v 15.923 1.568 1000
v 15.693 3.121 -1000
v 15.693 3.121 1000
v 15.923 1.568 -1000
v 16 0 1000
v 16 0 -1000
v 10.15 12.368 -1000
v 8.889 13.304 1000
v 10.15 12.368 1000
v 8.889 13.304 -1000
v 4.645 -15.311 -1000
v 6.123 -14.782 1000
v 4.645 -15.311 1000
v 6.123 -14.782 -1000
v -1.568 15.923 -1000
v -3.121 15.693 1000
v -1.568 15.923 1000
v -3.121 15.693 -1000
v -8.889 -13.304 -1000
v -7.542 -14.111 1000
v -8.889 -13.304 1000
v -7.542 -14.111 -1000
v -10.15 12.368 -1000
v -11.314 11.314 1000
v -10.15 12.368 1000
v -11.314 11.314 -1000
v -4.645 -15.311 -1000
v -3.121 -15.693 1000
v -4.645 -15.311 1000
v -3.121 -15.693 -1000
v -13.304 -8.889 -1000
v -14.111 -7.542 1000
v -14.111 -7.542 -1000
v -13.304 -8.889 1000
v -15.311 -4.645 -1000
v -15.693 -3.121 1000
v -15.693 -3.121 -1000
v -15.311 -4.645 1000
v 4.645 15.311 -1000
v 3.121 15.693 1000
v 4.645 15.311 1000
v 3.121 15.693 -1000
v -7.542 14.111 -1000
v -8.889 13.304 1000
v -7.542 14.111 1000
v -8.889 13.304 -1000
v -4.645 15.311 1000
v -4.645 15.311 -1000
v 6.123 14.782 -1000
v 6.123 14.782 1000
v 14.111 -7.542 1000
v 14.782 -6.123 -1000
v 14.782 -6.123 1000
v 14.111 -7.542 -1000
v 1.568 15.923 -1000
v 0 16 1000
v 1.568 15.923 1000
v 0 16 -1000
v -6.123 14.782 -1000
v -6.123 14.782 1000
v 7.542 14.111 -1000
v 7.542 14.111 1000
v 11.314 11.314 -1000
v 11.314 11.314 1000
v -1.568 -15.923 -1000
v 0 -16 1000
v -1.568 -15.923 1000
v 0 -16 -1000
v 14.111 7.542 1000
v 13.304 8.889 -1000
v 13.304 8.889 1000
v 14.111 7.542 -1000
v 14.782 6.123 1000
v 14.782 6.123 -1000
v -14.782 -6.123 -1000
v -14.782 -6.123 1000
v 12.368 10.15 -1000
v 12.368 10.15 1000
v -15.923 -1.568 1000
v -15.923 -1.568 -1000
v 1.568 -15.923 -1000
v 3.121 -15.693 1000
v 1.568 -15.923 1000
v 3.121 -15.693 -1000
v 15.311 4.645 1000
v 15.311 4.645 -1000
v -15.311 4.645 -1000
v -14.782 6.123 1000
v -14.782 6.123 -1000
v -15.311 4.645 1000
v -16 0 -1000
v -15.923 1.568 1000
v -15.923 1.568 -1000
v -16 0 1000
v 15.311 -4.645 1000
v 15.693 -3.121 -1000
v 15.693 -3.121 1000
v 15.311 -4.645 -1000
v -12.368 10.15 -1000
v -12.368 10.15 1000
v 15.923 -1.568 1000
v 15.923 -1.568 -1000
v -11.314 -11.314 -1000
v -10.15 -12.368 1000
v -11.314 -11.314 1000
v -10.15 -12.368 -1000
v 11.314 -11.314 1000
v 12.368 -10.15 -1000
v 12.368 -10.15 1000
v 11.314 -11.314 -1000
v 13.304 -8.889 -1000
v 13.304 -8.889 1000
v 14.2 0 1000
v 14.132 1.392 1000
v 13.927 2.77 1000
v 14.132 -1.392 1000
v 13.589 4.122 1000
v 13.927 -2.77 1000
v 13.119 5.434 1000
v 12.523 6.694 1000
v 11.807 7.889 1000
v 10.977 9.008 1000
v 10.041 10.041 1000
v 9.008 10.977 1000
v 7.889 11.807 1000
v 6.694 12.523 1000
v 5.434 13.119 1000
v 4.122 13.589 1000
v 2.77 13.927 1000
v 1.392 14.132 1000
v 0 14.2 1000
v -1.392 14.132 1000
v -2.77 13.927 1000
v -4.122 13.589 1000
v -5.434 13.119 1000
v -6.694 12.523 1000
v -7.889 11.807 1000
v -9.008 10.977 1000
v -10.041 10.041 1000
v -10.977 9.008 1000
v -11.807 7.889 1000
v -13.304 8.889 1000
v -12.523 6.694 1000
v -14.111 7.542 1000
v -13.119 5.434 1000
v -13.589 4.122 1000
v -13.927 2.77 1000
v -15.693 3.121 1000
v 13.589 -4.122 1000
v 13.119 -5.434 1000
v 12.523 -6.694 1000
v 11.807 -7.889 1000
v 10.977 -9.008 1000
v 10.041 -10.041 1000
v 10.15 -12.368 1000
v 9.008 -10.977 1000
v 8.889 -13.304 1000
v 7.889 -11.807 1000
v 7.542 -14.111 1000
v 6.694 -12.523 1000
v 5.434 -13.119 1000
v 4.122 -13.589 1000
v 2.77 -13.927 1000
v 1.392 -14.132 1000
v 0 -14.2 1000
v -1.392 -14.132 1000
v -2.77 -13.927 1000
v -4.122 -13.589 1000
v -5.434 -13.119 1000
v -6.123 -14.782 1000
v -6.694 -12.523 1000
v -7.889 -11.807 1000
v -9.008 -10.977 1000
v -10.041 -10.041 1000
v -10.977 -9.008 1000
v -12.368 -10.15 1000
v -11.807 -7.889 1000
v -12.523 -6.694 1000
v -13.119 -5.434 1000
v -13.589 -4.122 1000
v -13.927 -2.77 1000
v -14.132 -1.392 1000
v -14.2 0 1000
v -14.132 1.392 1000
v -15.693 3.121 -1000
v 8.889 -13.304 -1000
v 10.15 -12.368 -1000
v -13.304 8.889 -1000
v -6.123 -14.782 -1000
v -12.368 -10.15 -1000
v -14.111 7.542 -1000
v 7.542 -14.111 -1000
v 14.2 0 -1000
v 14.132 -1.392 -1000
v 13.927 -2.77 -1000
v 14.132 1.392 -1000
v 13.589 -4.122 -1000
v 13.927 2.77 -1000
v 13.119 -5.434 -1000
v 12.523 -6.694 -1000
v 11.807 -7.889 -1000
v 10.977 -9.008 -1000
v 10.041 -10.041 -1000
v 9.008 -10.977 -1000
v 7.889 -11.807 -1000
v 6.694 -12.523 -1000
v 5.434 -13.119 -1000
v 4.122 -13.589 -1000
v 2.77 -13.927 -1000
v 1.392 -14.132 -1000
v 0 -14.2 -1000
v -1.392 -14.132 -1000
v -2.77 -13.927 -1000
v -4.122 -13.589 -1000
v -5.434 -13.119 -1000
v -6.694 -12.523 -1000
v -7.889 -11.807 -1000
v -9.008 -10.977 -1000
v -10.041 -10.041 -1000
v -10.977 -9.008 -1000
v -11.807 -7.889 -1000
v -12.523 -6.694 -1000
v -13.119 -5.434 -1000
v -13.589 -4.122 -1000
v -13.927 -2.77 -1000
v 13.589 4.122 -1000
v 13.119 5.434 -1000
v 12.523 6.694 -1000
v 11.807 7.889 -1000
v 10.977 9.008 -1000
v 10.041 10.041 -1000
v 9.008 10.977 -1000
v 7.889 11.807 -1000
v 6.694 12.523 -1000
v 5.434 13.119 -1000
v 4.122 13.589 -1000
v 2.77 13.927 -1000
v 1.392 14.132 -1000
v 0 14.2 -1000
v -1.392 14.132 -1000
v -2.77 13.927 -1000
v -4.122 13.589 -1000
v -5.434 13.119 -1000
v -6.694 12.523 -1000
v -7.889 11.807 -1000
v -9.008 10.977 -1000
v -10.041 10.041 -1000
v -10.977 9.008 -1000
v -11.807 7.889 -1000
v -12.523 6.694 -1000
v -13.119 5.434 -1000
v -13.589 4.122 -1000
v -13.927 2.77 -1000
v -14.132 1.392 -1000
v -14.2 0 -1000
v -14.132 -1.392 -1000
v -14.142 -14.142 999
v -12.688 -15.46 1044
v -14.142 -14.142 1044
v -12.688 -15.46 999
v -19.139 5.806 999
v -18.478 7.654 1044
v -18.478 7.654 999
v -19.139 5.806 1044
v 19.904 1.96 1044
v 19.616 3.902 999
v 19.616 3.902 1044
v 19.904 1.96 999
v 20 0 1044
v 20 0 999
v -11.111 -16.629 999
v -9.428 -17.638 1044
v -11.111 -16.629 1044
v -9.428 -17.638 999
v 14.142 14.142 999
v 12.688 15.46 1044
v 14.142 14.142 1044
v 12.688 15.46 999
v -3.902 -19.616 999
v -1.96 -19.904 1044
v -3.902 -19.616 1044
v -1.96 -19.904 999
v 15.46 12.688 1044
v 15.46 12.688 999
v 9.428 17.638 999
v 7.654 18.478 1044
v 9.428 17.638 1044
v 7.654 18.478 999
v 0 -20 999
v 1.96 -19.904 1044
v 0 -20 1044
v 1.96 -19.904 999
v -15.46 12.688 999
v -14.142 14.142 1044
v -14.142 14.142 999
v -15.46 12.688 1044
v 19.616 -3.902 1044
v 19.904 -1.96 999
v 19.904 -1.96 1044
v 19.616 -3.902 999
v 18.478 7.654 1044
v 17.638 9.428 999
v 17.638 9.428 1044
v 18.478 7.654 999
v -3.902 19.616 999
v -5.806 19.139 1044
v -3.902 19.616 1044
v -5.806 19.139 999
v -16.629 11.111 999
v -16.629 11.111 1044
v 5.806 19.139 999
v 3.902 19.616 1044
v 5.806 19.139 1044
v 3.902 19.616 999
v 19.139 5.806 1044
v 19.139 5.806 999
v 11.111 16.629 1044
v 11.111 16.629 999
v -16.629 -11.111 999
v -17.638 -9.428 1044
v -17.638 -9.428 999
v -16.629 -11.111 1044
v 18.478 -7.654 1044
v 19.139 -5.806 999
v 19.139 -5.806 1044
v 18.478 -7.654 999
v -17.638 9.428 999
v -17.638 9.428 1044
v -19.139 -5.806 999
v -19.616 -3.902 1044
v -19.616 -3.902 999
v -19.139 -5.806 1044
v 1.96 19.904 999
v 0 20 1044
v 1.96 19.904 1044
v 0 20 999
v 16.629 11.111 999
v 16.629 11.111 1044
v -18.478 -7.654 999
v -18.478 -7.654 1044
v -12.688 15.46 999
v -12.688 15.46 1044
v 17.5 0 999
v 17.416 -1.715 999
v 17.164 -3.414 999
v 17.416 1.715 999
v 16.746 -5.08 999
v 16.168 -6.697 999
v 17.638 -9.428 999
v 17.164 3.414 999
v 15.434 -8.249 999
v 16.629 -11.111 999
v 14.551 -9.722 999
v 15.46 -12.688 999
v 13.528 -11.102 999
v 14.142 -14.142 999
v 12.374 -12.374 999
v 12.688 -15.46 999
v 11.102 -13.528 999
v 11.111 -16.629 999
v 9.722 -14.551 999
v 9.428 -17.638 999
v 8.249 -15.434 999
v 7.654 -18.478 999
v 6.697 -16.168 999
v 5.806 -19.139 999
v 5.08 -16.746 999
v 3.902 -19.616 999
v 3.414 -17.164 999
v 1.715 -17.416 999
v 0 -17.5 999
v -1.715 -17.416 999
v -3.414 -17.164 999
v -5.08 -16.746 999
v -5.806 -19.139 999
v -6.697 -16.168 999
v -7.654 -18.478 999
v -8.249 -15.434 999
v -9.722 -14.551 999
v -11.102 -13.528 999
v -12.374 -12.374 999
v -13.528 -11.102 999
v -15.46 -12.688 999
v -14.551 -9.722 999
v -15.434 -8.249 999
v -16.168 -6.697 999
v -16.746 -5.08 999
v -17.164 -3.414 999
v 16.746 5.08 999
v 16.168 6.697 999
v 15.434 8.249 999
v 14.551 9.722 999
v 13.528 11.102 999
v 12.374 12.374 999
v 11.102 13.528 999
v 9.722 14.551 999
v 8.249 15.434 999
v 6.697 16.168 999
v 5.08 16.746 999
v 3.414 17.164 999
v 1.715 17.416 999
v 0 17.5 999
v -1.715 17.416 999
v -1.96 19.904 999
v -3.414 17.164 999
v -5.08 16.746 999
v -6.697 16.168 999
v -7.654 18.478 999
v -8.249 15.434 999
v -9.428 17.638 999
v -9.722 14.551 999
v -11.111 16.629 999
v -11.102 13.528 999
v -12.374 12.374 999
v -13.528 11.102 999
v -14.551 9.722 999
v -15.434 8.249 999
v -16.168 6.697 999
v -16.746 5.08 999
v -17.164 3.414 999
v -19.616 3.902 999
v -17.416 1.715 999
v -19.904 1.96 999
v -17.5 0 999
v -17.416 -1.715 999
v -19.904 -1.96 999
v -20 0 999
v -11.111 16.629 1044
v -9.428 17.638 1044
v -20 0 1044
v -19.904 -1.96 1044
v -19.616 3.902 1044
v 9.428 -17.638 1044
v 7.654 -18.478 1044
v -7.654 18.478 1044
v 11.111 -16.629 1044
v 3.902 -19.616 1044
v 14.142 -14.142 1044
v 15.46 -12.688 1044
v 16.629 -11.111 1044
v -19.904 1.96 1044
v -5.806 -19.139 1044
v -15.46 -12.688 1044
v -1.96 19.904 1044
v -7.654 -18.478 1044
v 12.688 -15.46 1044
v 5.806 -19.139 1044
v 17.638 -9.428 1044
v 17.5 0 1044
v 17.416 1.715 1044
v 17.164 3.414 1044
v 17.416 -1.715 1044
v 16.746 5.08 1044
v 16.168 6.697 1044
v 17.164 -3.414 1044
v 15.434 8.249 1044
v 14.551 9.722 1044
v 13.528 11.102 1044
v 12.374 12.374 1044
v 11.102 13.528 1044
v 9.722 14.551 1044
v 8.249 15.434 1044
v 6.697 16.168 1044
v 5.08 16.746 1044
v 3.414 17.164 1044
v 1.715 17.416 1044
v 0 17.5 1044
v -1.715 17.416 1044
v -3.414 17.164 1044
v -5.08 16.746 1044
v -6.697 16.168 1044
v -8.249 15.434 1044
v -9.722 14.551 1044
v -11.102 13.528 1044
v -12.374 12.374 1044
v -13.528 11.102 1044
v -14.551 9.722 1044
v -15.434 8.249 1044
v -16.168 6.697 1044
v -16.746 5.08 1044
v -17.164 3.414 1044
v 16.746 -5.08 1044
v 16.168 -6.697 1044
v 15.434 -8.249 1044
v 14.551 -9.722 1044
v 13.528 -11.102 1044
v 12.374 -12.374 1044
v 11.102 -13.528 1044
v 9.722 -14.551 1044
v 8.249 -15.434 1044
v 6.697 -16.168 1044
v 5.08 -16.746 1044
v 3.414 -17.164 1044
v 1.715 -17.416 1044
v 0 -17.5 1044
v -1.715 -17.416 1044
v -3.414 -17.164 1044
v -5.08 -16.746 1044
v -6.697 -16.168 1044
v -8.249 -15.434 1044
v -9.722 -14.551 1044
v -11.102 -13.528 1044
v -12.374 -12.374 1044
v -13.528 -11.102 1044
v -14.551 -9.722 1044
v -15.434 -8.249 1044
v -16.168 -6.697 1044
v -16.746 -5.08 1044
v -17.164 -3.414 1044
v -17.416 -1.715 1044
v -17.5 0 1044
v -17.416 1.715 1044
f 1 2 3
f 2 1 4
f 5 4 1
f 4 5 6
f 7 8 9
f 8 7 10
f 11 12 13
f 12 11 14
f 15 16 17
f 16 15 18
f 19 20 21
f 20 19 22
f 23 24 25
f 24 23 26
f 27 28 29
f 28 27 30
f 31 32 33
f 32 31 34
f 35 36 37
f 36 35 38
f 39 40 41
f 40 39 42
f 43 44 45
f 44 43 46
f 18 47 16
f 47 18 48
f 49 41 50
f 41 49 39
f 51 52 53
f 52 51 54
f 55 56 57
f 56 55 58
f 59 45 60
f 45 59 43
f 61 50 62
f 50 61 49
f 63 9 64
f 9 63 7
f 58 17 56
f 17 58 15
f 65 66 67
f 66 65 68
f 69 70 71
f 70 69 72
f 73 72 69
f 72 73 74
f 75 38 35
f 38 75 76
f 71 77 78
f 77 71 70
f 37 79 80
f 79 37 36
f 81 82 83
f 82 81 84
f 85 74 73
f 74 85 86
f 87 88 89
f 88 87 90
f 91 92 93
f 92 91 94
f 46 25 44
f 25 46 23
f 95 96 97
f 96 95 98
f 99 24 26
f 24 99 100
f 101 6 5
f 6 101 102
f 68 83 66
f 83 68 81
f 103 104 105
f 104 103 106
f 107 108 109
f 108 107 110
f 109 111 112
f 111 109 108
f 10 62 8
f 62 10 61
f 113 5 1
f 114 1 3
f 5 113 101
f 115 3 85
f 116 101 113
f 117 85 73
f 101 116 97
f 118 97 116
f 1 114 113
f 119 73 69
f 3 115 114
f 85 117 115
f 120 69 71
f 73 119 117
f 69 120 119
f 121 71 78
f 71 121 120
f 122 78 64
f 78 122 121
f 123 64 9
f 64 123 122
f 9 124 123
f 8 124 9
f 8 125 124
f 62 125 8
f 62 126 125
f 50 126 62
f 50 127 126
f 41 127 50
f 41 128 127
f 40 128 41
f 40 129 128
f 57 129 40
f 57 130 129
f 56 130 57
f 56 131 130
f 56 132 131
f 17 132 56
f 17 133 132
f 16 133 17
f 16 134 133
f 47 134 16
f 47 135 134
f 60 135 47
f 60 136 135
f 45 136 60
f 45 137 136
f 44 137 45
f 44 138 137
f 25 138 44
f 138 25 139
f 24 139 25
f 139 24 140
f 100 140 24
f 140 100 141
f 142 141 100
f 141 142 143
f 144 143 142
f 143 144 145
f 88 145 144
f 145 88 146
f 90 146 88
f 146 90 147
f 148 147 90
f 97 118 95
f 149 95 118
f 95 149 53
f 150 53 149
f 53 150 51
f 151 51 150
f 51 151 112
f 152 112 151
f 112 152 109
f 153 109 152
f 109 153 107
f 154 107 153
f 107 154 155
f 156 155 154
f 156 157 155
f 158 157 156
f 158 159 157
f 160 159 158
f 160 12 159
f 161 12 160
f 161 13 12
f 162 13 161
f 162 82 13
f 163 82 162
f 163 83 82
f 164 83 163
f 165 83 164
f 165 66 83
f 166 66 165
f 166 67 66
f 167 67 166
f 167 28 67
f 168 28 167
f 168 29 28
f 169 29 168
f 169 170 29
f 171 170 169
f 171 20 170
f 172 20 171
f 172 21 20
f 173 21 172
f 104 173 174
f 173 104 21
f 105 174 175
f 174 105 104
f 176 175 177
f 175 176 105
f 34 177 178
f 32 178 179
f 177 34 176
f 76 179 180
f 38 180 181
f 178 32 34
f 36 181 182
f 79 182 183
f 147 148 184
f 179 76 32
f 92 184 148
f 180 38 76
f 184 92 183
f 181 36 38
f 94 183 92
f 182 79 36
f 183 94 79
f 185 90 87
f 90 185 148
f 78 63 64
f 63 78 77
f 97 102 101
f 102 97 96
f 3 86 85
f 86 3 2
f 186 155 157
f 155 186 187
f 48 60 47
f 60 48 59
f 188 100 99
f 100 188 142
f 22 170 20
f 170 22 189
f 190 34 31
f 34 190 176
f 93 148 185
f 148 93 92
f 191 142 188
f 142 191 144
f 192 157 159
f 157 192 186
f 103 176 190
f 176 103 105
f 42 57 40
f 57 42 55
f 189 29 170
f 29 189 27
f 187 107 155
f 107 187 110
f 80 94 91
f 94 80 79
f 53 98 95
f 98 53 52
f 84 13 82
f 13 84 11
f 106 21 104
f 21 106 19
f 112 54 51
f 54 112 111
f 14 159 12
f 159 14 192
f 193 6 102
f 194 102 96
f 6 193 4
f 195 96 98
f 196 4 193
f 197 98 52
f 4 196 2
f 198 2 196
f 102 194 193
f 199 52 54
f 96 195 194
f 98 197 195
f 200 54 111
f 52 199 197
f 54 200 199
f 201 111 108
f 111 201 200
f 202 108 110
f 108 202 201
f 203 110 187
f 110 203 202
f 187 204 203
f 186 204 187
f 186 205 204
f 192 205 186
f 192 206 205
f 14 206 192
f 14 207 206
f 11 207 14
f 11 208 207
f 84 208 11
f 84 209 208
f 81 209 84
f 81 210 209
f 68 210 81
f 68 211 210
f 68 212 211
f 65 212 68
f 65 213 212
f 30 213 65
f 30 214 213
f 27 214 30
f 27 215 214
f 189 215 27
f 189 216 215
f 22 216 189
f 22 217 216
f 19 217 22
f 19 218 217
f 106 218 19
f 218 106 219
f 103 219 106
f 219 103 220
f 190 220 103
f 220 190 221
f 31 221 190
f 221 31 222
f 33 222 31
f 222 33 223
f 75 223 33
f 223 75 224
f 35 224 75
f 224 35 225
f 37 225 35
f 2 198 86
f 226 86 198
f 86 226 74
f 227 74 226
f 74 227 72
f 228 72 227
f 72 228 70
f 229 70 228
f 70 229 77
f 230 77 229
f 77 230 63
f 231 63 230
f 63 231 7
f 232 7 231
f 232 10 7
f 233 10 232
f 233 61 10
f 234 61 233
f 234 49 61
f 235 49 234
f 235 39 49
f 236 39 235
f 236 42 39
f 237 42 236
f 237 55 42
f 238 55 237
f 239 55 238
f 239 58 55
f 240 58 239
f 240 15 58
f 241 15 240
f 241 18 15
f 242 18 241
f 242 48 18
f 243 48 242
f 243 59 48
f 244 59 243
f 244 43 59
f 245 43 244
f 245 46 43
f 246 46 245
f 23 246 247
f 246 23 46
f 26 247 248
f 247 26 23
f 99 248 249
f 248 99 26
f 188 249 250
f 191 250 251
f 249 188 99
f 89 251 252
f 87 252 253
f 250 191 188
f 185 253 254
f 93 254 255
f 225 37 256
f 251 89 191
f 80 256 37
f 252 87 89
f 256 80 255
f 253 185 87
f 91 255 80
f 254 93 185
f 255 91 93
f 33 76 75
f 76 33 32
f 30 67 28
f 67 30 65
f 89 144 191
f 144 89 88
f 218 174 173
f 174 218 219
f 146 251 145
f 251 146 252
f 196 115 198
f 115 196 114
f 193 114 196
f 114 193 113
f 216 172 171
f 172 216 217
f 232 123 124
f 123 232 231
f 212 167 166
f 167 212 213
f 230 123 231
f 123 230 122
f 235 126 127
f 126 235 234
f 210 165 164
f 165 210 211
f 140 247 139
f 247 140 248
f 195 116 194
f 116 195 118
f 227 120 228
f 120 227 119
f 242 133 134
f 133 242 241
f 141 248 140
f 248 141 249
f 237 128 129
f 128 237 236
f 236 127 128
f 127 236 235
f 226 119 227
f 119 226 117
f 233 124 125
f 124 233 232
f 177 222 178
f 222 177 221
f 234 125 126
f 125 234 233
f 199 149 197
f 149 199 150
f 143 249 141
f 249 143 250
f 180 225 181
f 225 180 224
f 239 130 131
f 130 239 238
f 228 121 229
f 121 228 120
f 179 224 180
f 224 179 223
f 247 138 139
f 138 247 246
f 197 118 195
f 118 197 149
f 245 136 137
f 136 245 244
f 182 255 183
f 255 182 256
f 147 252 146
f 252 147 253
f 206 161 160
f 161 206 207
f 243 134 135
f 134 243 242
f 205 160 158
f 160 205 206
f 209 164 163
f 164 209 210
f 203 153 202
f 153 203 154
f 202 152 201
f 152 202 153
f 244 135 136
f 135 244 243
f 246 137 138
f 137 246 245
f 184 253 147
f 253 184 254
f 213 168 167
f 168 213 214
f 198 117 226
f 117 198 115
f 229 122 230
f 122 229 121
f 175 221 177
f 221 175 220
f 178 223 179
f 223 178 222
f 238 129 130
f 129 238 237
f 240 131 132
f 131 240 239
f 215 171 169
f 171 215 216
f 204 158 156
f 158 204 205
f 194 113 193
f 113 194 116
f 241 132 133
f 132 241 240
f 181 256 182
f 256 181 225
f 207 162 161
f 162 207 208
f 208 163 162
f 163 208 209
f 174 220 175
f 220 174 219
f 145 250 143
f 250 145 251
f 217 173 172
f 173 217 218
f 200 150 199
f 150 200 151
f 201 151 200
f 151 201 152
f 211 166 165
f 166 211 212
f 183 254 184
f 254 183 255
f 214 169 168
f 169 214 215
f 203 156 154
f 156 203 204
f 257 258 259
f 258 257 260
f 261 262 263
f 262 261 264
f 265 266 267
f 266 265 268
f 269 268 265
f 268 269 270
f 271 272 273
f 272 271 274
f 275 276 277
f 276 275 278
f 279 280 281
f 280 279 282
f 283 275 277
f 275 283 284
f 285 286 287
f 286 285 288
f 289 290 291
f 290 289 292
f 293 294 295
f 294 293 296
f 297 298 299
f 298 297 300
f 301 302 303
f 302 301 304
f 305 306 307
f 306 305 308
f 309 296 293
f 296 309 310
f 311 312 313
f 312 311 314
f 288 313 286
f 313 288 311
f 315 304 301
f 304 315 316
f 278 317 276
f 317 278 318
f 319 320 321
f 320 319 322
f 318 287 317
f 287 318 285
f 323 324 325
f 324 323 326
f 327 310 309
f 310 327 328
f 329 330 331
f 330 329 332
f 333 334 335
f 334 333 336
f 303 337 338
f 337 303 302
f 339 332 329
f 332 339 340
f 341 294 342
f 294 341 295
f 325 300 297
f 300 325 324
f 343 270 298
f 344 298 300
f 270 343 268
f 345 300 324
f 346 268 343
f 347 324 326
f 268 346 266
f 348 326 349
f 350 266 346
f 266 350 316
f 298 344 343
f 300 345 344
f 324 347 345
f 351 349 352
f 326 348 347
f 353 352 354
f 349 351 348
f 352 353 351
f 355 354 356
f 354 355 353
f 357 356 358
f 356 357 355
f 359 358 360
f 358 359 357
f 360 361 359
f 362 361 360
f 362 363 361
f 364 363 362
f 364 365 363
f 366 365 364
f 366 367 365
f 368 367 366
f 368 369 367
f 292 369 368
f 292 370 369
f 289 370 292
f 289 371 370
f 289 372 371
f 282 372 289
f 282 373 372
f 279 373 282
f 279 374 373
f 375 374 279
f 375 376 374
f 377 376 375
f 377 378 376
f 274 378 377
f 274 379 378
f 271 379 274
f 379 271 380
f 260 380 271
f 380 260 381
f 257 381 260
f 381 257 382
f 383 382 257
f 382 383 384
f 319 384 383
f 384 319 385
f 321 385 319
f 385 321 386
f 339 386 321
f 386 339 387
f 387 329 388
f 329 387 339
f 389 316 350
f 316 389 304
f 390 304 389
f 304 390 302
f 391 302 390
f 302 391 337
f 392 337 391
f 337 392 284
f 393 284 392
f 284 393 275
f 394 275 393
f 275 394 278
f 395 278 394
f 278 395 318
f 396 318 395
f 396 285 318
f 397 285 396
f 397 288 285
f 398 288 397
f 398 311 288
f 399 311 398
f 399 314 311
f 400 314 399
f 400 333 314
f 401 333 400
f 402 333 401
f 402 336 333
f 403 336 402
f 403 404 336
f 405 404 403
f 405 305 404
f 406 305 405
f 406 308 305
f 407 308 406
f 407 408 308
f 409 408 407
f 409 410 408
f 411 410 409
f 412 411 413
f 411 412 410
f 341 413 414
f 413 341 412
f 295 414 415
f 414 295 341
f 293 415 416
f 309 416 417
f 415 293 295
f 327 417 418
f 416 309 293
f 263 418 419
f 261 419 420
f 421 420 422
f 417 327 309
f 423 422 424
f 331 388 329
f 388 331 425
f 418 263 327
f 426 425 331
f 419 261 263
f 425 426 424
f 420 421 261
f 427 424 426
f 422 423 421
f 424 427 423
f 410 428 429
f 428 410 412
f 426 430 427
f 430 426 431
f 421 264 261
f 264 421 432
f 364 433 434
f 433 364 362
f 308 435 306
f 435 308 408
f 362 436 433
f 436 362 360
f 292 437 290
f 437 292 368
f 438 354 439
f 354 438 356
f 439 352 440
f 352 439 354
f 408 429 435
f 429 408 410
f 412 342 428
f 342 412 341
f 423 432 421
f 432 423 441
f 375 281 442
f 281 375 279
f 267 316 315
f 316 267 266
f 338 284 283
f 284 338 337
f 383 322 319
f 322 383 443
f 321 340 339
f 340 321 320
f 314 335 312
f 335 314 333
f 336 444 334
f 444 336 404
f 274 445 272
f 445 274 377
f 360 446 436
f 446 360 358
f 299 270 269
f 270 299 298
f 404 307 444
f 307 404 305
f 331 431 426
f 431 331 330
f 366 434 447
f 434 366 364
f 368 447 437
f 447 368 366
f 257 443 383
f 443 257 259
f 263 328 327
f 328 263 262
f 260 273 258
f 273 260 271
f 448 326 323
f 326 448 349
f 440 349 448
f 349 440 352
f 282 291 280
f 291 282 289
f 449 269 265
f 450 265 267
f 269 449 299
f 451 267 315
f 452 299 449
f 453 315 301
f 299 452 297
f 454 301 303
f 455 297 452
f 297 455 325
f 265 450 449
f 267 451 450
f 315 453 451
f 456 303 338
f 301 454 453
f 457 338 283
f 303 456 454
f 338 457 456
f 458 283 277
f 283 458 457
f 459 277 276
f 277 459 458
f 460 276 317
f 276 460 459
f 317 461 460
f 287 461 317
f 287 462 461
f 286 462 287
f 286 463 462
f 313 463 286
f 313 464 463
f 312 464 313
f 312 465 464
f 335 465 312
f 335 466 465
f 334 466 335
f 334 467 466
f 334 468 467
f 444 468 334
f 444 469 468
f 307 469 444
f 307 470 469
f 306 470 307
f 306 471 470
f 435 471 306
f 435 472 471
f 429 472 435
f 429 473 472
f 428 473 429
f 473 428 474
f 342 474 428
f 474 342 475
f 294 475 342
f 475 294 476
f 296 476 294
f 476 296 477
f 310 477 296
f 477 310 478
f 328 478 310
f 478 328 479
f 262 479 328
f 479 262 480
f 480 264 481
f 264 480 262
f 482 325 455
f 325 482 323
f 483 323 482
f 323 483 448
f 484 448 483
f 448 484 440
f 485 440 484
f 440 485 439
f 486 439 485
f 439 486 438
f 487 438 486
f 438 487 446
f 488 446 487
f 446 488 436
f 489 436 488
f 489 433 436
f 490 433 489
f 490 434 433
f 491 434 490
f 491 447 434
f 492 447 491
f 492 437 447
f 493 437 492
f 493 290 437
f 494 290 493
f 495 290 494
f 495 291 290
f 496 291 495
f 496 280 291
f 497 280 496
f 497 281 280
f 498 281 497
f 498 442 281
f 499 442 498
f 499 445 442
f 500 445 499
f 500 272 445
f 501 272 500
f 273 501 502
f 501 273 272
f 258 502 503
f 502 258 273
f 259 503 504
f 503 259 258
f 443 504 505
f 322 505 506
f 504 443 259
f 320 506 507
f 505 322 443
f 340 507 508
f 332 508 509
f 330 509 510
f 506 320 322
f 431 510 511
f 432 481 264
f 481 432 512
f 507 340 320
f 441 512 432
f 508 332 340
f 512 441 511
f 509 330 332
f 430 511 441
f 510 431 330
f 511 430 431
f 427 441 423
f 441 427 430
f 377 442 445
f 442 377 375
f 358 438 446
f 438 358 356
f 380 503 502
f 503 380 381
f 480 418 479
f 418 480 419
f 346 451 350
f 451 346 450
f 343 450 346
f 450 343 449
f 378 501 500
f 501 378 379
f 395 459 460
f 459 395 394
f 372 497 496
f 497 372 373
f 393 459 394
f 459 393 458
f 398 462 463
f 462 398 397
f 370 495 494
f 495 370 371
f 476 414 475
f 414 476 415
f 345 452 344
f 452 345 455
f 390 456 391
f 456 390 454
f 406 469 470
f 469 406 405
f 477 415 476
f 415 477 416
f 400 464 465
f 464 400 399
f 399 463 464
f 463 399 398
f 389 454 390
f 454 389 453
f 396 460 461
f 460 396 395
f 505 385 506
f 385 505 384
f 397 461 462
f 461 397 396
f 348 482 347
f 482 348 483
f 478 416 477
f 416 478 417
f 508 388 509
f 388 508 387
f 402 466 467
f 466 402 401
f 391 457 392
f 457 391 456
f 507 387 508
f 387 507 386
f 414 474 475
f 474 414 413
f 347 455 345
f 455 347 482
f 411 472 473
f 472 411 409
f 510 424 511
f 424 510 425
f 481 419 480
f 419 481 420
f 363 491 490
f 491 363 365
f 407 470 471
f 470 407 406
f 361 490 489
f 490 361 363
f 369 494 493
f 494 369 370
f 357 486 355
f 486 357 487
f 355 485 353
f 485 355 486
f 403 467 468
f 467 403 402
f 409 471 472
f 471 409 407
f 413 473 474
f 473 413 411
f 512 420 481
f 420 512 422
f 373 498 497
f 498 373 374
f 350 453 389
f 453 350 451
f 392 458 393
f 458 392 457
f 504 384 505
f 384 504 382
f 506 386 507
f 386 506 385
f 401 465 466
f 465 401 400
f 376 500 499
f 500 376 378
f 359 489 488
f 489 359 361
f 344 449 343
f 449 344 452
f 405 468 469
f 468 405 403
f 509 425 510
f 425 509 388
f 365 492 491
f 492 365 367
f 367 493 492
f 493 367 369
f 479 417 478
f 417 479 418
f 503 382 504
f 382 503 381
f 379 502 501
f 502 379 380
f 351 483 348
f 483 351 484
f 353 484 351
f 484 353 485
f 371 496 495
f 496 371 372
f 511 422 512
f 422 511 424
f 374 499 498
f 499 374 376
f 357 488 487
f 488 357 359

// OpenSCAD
// Parameters
pipe_standard = 1; //[1:1:1]
nominal_diameter_mm = 32; //[16:64:1]
length_mm = 2000; //[1000:4000:10]
outer_diameter_mm = 32; //[20:64:0.5]
wall_thickness_mm = 1.8; //[1:4:0.1]
inner_diameter_mm = 28.4; //[16:60:0.5]
include_end_fitting = 1; //[0:1:1]
overlap_mm = 1; //[0.5:2:0.1]
fitting_length_mm = 45; //[20:90:1]
fitting_outer_diameter_mm = 40; //[32:80:0.5]
fitting_wall_thickness_mm = 2.5; //[1.5:6:0.1]

// HT Pipe Segment - Complete Geometry
module ht_pipe_segment() {
  color([0.85, 0.85, 0.8]) {
    difference() {
      // Outer pipe
      translate([0, 0, 0])
        cylinder(h=length_mm, r=outer_diameter_mm/2, center=true, $fn=64);
      // Inner void
      translate([0, 0, 0])
        cylinder(h=length_mm + 2*overlap_mm, r=inner_diameter_mm/2, center=true, $fn=64);
    }
  }
}

// End Fitting - Complete Geometry
module end_fitting() {
  if (include_end_fitting) {
    color([0.85, 0.85, 0.8]) {
      difference() {
        // Outer fitting
        translate([0, 0, length_mm/2 + fitting_length_mm/2 - overlap_mm])
          cylinder(h=fitting_length_mm, r=fitting_outer_diameter_mm/2, center=true, $fn=64);
        // Inner void
        translate([0, 0, length_mm/2 + fitting_length_mm/2 - overlap_mm])
          cylinder(h=fitting_length_mm + 2*overlap_mm, r=(fitting_outer_diameter_mm - 2*fitting_wall_thickness_mm)/2, center=true, $fn=64);
      }
    }
  }
}

// HT Pipe - Complete Assembly
module ht_pipe() {
  union() {
    ht_pipe_segment();
    end_fitting();
  }
}

// Final Assembly
module assembly() {
  ht_pipe();
}

assembly();
